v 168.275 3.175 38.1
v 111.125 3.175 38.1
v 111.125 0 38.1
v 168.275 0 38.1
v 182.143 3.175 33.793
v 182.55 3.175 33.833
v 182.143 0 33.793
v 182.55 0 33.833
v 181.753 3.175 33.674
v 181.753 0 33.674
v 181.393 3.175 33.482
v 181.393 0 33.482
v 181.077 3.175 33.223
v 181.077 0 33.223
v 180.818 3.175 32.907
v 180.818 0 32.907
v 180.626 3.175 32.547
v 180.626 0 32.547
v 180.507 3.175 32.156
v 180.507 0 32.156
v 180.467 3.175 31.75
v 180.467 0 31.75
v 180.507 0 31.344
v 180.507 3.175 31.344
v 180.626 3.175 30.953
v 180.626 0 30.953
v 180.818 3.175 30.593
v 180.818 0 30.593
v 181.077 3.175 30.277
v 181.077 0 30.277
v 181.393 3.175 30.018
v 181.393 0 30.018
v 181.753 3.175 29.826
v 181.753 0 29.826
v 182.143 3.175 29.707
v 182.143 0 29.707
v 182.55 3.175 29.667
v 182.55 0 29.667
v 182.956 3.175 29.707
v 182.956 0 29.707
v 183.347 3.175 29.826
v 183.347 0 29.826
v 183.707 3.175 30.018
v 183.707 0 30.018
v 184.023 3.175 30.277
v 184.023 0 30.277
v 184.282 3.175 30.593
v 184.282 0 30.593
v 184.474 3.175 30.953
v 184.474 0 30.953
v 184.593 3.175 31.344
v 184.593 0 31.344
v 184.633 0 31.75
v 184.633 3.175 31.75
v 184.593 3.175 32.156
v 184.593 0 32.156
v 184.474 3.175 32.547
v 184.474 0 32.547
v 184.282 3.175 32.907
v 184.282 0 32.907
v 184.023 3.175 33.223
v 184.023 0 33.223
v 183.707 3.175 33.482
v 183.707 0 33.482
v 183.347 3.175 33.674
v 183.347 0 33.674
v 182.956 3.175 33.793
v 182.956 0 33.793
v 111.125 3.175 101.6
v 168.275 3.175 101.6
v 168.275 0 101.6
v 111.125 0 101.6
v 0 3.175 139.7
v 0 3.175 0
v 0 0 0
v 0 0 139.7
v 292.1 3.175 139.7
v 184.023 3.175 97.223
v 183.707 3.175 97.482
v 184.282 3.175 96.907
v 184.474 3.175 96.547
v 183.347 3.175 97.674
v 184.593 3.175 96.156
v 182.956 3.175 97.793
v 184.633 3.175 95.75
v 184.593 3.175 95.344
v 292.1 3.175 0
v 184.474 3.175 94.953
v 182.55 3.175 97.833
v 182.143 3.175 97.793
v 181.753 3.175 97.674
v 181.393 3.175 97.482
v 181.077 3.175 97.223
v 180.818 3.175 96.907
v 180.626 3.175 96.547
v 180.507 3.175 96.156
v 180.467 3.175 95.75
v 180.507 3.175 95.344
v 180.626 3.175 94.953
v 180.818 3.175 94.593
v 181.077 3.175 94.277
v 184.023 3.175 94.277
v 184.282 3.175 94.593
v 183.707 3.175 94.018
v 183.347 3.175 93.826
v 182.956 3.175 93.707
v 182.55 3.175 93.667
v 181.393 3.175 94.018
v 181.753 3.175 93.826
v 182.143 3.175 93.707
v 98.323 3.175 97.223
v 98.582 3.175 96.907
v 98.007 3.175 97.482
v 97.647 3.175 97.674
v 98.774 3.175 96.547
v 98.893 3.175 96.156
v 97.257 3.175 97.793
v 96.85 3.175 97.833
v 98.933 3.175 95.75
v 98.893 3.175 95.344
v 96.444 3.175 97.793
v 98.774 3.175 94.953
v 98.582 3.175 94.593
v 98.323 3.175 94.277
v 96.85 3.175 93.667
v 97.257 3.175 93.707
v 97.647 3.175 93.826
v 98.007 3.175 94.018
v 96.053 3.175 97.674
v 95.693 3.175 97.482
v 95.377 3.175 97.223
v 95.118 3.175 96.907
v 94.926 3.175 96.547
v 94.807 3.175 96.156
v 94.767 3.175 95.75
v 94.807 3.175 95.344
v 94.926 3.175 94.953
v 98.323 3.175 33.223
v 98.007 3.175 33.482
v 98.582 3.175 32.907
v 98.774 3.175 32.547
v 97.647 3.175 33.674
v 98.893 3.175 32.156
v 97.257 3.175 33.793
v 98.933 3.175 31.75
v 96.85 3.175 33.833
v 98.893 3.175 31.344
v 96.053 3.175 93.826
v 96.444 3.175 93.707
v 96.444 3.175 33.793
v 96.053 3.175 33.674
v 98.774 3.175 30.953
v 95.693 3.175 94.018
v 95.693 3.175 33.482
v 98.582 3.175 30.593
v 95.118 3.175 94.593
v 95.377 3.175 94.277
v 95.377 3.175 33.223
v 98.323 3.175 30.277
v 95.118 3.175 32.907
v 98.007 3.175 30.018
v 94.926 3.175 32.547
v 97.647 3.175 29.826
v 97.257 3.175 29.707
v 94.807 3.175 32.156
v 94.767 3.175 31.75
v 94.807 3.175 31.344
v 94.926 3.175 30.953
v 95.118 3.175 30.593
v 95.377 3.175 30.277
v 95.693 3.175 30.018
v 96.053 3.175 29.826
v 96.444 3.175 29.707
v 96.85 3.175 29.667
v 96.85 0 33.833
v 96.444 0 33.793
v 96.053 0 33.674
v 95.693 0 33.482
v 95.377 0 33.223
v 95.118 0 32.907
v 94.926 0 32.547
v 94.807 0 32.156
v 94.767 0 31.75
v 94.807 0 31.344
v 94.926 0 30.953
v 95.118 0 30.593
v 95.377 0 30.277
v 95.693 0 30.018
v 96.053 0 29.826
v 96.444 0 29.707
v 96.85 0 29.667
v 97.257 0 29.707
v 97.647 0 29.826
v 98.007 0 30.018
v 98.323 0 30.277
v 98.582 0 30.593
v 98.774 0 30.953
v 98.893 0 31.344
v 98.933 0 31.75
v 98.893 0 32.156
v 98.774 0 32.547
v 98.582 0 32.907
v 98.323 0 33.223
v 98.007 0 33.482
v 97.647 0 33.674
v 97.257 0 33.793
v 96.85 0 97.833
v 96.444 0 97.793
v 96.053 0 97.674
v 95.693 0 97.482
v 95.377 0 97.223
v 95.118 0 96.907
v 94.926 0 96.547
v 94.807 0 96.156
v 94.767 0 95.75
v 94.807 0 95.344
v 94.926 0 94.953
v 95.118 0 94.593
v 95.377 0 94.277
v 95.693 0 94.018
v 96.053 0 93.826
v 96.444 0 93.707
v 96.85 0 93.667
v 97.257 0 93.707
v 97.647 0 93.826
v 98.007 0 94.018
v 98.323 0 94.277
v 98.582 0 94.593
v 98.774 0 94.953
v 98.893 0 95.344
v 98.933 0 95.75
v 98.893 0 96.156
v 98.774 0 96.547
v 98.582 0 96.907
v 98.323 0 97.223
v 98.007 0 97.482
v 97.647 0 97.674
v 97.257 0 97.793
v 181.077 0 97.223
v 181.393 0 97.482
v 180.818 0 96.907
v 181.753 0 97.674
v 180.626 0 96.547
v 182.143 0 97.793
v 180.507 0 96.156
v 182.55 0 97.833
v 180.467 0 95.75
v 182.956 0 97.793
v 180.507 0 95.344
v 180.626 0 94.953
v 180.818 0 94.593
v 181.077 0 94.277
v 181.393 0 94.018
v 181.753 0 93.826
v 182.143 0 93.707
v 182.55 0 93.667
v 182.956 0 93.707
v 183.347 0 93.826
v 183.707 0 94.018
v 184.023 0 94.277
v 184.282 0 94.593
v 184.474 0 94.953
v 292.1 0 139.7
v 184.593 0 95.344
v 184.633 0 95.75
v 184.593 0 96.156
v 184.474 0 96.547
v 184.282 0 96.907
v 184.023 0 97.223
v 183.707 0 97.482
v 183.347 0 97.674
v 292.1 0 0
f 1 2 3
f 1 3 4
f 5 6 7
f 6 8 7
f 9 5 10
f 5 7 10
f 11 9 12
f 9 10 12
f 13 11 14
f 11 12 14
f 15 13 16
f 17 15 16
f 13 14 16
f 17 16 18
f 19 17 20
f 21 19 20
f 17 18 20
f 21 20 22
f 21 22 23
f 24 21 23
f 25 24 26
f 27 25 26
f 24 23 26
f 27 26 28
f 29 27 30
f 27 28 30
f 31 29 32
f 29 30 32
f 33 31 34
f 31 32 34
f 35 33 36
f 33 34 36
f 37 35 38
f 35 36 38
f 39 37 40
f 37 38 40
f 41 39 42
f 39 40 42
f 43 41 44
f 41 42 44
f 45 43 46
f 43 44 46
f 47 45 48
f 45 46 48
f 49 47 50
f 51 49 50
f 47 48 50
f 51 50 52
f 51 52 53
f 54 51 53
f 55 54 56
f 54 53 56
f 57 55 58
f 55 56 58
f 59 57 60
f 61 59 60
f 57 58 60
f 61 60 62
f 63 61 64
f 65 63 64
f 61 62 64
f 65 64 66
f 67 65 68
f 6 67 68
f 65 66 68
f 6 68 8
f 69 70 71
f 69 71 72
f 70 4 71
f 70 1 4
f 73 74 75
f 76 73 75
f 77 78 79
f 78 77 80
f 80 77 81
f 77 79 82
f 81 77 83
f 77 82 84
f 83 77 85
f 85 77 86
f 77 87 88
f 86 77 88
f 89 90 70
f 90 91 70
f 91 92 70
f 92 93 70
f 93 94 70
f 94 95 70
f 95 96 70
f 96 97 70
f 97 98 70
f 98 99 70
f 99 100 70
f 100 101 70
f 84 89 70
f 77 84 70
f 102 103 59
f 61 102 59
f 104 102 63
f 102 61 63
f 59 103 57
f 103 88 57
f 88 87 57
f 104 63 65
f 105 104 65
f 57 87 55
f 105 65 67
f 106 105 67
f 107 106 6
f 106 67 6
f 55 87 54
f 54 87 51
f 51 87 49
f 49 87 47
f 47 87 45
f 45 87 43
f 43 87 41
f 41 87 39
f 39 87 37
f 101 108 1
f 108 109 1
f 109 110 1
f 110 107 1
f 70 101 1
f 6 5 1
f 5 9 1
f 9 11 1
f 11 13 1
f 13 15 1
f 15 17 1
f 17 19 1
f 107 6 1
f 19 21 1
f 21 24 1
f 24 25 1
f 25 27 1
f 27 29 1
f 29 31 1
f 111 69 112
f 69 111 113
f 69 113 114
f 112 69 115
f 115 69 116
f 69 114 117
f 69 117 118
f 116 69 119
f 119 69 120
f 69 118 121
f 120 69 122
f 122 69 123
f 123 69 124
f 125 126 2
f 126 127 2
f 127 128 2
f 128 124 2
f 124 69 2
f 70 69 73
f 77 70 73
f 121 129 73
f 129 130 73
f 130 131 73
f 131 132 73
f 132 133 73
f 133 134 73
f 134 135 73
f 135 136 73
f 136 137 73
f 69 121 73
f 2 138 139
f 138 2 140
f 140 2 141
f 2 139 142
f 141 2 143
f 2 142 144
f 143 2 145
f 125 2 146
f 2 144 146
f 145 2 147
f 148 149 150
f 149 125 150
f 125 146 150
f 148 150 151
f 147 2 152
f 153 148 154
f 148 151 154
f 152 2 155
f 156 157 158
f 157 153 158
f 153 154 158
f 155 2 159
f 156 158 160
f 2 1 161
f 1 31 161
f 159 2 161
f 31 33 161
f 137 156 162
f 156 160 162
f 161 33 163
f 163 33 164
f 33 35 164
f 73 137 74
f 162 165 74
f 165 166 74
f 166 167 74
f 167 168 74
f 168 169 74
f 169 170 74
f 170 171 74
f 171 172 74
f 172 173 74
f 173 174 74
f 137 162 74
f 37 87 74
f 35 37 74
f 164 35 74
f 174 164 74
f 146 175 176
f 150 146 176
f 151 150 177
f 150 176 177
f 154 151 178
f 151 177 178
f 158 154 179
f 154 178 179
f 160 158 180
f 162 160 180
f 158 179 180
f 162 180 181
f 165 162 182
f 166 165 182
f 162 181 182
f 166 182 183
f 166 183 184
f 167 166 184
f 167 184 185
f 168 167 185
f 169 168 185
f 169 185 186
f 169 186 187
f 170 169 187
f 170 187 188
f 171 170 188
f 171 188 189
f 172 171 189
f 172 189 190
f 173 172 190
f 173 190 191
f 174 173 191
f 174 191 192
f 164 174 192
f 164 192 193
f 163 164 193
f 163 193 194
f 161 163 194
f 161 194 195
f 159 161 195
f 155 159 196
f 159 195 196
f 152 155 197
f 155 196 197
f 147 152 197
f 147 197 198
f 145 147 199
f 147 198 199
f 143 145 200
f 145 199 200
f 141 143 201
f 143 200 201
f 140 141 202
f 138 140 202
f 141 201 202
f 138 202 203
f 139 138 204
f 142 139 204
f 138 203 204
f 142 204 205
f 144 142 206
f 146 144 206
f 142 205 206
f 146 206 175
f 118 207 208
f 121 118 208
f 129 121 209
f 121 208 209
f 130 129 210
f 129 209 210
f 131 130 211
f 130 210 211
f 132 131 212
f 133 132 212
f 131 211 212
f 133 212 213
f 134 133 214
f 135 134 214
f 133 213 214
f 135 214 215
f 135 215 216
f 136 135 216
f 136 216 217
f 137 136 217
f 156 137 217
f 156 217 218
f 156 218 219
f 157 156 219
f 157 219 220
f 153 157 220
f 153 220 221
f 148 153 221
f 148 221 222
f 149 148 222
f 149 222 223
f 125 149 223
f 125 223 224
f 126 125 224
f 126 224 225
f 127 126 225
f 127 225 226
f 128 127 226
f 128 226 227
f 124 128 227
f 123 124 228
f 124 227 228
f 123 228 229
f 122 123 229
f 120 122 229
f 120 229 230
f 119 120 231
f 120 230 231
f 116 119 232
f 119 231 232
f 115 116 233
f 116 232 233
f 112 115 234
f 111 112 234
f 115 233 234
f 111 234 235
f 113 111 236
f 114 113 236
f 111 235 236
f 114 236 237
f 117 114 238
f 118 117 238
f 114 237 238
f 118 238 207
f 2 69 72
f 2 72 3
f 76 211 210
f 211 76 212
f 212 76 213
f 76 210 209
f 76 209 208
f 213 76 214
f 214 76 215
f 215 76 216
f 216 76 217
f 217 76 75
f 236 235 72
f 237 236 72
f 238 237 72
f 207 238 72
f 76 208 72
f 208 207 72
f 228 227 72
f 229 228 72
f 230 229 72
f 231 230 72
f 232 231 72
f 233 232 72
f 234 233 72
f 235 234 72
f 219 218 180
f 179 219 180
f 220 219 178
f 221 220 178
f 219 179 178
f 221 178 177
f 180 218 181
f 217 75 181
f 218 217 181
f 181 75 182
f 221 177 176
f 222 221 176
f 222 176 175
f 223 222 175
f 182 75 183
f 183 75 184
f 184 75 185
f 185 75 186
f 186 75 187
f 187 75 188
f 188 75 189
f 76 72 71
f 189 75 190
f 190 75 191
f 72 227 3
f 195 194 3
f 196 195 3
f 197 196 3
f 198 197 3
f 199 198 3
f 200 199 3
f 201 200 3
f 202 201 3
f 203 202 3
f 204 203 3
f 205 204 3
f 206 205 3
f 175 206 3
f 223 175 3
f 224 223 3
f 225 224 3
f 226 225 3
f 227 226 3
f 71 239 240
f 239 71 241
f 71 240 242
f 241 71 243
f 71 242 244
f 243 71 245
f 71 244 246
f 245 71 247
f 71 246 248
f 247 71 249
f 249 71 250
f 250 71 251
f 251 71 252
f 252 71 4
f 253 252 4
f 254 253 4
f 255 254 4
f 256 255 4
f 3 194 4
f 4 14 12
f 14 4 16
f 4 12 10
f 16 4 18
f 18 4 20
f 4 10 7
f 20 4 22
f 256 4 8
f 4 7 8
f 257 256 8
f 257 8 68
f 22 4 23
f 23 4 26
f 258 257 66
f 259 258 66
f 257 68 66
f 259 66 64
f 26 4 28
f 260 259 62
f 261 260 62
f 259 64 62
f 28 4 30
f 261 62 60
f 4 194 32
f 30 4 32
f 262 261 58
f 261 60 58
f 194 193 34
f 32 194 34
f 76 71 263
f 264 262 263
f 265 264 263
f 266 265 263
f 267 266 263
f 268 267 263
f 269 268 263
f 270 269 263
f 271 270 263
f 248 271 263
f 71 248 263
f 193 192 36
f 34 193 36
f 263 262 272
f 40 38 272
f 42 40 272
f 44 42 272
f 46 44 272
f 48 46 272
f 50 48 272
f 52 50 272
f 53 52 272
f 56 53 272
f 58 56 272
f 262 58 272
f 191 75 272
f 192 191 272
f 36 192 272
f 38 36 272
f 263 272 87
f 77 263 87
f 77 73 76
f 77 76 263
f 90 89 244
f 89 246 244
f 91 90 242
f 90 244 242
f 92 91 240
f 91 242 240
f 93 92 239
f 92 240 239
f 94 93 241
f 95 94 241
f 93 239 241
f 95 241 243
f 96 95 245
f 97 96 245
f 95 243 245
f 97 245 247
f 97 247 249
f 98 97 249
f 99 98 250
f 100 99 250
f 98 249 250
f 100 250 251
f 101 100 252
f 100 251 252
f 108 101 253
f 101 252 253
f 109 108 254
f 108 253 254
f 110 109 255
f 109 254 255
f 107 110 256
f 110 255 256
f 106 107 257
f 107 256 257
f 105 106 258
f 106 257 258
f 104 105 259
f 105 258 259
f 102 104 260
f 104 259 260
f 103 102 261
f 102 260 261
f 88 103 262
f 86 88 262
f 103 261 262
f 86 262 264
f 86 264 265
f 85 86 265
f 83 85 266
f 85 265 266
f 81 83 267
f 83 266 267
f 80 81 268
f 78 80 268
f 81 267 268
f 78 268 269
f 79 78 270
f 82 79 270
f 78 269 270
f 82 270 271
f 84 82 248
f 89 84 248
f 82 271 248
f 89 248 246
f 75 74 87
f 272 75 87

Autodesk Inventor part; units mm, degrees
ref_plane "YZ Plane" through (0, 0, 0) normal (1, 0, 0) x (0, 1, 0)
ref_plane "XZ Plane" through (0, 0, 0) normal (0, 1, 0) x (-1, 0, 0)
ref_plane "XY Plane" through (0, 0, 0) normal (0, 0, 1) x (1, 0, 0)
sketch "Sketch1" plane through (0, 0, 0) normal (0, 0, 1) x (1, 0, 0)
  line L0 (0, 0) -> (292.1, 0)
  line L1 (292.1, 0) -> (292.1, 3.175)
  line L2 (292.1, 3.175) -> (0, 3.175)
  line L3 (0, 3.175) -> (0, 0)
  dimension "d0" = 292.1
  dimension "d1" = 3.175
extrude "Extrusion1" add sketch "Sketch1" along normal blind 139.7
sketch "Sketch2" plane through (0, 3.175, 0) normal (0, 1, 0) x (1, 0, 0)
  point P0 (0, 0)
  point P1 (96.8502, -31.75)
  point P2 (96.8502, -95.75)
  point P3 (182.5498, -31.75)
  point P4 (182.5498, -95.75)
  dimension "d4" = 64
  dimension "d5" = 31.75
  dimension "d6" = 64
  dimension "d7" = 31.75
  dimension "d15" = 85.6996
  dimension "d16" = 85.6996
  dimension "d17" = 96.8502
  dimension "d18" = 96.8502
hole "Hole1" at (96.8502, 3.175, 31.75) at (96.8502, 3.175, 95.75) at (182.5498, 3.175, 31.75) at (182.5498, 3.175, 95.75) direction (0, -1, 0) diameter 4.1656 end through all
sketch "Sketch3" plane through (0, 3.175, 0) normal (0, 1, 0) x (1, 0, 0)
  line L0 (111.125, -38.1) -> (168.275, -38.1)
  line L1 (168.275, -38.1) -> (168.275, -101.6)
  line L2 (168.275, -101.6) -> (111.125, -101.6)
  line L3 (111.125, -101.6) -> (111.125, -38.1)
  line L4 (292.1, -139.7) -> (0, -139.7) projected
  point P0 (0, 0)
  dimension "d19" = 57.15
  dimension "d20" = 63.5
  dimension "d24" = 111.125
  dimension "d26" = 38.1
extrude "Extrusion2" cut sketch "Sketch3" against normal blind 25.4
equation "\"d6\" = d4"
equation "\"d7\" = d5"
equation "\"d16\" = d15"
equation "\"d17\" = d18"
properties part number "Winch baseplate"
